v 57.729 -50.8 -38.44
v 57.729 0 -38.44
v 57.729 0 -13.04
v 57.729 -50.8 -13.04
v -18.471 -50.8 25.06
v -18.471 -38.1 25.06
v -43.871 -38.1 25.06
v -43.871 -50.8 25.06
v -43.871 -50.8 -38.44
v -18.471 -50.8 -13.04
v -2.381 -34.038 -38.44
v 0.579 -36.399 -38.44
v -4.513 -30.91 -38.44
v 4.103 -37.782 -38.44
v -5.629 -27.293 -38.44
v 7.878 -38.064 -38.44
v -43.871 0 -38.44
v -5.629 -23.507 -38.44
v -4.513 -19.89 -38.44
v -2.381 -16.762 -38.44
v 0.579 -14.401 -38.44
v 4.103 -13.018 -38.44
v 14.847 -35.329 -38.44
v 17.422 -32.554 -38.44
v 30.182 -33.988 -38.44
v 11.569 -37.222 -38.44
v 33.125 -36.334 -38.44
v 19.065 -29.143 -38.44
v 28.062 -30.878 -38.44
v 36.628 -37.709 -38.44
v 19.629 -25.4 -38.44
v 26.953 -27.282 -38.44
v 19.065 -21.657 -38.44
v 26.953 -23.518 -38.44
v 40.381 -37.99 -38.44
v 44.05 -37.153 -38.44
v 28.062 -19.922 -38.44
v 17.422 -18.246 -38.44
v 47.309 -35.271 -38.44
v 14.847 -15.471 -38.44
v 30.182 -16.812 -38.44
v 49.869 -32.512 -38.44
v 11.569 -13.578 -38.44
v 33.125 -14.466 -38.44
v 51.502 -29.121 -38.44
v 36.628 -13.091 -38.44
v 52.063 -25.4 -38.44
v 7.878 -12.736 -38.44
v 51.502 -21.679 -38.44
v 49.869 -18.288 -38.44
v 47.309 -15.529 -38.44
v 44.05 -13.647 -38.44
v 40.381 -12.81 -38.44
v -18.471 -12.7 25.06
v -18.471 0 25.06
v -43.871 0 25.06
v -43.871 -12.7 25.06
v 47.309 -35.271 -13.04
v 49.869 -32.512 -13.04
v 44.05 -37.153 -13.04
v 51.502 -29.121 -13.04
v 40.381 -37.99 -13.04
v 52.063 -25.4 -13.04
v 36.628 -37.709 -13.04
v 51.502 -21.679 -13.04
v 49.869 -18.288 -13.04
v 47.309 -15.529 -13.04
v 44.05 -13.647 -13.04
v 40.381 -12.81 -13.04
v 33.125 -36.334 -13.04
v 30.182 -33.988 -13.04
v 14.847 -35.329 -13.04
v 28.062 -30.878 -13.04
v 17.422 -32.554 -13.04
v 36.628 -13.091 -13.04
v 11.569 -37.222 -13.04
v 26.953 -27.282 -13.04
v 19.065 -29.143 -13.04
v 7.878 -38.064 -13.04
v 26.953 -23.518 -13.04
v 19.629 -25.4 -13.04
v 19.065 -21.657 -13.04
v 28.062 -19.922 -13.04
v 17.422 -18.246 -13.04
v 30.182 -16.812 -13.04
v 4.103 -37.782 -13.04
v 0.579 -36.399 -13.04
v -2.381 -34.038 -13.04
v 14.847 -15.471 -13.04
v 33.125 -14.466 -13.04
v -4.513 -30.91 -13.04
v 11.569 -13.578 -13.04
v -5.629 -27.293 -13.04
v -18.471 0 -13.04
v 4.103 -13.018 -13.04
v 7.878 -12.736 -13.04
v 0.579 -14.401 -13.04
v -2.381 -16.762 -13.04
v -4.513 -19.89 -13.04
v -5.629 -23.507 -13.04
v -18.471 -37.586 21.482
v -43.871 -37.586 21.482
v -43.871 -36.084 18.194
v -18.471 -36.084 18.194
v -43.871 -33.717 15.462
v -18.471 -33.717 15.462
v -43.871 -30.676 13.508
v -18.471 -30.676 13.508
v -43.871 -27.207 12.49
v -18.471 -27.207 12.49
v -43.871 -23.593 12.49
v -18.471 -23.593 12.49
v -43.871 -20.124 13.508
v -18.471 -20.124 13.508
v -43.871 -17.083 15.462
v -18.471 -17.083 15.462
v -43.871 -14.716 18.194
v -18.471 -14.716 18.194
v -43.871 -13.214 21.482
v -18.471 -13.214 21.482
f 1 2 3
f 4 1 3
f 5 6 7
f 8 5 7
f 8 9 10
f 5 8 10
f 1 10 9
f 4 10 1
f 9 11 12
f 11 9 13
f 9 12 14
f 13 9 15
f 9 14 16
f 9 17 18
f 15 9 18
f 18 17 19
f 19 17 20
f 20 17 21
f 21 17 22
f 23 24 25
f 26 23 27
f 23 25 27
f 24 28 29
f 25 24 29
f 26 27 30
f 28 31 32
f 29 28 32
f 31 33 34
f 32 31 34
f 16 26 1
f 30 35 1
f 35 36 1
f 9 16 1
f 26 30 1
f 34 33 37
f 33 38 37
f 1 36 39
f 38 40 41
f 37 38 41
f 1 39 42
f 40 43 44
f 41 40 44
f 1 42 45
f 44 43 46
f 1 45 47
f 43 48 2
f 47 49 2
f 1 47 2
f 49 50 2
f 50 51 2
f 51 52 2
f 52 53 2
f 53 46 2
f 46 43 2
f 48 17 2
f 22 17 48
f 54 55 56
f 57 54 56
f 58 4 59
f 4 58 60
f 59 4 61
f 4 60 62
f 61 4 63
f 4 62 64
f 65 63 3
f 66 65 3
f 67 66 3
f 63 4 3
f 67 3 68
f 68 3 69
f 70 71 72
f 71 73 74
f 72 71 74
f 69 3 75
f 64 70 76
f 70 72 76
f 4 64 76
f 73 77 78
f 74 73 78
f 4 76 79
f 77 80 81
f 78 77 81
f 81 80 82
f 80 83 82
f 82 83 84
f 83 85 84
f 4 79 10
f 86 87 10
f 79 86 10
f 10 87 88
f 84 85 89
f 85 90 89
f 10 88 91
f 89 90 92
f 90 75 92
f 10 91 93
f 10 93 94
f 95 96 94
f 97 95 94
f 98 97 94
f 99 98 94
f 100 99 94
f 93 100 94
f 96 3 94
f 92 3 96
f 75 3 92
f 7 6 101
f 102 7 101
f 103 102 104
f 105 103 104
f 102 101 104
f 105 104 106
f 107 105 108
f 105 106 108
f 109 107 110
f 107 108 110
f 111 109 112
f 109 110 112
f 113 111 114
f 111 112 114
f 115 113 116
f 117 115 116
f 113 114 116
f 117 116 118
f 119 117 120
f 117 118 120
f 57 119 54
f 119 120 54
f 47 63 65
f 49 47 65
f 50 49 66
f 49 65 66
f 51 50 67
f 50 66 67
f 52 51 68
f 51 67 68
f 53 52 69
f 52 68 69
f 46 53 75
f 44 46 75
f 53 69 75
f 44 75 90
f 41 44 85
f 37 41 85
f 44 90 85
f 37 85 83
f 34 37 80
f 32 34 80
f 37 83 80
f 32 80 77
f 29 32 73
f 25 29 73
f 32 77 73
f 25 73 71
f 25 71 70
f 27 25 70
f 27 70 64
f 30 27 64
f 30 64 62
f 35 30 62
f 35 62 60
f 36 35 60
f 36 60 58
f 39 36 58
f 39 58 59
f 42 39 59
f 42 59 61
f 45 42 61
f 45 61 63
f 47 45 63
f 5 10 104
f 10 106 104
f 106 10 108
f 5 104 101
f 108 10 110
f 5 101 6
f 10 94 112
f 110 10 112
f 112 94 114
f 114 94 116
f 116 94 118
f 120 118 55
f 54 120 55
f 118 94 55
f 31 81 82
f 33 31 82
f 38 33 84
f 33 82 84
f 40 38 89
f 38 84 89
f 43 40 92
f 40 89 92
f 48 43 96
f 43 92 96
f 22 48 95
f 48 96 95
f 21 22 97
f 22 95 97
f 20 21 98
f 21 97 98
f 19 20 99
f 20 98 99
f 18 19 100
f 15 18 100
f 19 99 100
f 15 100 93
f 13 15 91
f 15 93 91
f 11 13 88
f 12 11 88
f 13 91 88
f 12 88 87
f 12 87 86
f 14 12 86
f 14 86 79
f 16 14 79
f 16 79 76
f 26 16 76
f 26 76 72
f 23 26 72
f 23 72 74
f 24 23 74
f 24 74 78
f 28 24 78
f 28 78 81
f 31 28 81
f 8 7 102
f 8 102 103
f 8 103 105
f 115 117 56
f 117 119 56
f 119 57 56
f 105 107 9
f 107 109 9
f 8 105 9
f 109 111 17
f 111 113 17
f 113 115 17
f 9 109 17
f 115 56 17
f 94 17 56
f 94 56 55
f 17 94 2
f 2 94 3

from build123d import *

# Parameters (mm, degrees)
F1_DEPTH = 50.8
F3_DEPTH = 80.264
F4_R     = 12.7
F4_R_2   = 12.625616
F5_DEPTH = 50.8


with BuildPart() as f1:
    # F0 (on Front) → F1 (new body)
    with BuildSketch(Plane.XZ):
        Polygon((-18.470924, 25.060495), (-43.870924, 25.060495), (-43.870924, -38.439505), (57.729076, -38.439505), (57.729076, -13.039505), (-18.470924, -13.039505), align=None)
    extrude(amount=F1_DEPTH)

    # F2 (on face) → F3 (cut)
    with BuildSketch(Plane.YZ.offset(-18.470924)):
        with BuildLine():
            Line((-12.7, 25.060495), (-38.1, 25.060495))
            ThreePointArc((-38.1, 25.060495), (-25.4, 12.360495), (-12.7, 25.060495))
        make_face()
    extrude(amount=-F3_DEPTH, mode=Mode.SUBTRACT)

    # F4 (on face) → F5 (cut)
    with BuildSketch(Plane.XY.offset(-13.039505)):
        with Locations((6.929076, -25.4)):
            Circle(F4_R)
        with Locations((39.437555, -25.4)):
            Circle(F4_R_2)
    extrude(amount=-F5_DEPTH, mode=Mode.SUBTRACT)


solid = f1.part
